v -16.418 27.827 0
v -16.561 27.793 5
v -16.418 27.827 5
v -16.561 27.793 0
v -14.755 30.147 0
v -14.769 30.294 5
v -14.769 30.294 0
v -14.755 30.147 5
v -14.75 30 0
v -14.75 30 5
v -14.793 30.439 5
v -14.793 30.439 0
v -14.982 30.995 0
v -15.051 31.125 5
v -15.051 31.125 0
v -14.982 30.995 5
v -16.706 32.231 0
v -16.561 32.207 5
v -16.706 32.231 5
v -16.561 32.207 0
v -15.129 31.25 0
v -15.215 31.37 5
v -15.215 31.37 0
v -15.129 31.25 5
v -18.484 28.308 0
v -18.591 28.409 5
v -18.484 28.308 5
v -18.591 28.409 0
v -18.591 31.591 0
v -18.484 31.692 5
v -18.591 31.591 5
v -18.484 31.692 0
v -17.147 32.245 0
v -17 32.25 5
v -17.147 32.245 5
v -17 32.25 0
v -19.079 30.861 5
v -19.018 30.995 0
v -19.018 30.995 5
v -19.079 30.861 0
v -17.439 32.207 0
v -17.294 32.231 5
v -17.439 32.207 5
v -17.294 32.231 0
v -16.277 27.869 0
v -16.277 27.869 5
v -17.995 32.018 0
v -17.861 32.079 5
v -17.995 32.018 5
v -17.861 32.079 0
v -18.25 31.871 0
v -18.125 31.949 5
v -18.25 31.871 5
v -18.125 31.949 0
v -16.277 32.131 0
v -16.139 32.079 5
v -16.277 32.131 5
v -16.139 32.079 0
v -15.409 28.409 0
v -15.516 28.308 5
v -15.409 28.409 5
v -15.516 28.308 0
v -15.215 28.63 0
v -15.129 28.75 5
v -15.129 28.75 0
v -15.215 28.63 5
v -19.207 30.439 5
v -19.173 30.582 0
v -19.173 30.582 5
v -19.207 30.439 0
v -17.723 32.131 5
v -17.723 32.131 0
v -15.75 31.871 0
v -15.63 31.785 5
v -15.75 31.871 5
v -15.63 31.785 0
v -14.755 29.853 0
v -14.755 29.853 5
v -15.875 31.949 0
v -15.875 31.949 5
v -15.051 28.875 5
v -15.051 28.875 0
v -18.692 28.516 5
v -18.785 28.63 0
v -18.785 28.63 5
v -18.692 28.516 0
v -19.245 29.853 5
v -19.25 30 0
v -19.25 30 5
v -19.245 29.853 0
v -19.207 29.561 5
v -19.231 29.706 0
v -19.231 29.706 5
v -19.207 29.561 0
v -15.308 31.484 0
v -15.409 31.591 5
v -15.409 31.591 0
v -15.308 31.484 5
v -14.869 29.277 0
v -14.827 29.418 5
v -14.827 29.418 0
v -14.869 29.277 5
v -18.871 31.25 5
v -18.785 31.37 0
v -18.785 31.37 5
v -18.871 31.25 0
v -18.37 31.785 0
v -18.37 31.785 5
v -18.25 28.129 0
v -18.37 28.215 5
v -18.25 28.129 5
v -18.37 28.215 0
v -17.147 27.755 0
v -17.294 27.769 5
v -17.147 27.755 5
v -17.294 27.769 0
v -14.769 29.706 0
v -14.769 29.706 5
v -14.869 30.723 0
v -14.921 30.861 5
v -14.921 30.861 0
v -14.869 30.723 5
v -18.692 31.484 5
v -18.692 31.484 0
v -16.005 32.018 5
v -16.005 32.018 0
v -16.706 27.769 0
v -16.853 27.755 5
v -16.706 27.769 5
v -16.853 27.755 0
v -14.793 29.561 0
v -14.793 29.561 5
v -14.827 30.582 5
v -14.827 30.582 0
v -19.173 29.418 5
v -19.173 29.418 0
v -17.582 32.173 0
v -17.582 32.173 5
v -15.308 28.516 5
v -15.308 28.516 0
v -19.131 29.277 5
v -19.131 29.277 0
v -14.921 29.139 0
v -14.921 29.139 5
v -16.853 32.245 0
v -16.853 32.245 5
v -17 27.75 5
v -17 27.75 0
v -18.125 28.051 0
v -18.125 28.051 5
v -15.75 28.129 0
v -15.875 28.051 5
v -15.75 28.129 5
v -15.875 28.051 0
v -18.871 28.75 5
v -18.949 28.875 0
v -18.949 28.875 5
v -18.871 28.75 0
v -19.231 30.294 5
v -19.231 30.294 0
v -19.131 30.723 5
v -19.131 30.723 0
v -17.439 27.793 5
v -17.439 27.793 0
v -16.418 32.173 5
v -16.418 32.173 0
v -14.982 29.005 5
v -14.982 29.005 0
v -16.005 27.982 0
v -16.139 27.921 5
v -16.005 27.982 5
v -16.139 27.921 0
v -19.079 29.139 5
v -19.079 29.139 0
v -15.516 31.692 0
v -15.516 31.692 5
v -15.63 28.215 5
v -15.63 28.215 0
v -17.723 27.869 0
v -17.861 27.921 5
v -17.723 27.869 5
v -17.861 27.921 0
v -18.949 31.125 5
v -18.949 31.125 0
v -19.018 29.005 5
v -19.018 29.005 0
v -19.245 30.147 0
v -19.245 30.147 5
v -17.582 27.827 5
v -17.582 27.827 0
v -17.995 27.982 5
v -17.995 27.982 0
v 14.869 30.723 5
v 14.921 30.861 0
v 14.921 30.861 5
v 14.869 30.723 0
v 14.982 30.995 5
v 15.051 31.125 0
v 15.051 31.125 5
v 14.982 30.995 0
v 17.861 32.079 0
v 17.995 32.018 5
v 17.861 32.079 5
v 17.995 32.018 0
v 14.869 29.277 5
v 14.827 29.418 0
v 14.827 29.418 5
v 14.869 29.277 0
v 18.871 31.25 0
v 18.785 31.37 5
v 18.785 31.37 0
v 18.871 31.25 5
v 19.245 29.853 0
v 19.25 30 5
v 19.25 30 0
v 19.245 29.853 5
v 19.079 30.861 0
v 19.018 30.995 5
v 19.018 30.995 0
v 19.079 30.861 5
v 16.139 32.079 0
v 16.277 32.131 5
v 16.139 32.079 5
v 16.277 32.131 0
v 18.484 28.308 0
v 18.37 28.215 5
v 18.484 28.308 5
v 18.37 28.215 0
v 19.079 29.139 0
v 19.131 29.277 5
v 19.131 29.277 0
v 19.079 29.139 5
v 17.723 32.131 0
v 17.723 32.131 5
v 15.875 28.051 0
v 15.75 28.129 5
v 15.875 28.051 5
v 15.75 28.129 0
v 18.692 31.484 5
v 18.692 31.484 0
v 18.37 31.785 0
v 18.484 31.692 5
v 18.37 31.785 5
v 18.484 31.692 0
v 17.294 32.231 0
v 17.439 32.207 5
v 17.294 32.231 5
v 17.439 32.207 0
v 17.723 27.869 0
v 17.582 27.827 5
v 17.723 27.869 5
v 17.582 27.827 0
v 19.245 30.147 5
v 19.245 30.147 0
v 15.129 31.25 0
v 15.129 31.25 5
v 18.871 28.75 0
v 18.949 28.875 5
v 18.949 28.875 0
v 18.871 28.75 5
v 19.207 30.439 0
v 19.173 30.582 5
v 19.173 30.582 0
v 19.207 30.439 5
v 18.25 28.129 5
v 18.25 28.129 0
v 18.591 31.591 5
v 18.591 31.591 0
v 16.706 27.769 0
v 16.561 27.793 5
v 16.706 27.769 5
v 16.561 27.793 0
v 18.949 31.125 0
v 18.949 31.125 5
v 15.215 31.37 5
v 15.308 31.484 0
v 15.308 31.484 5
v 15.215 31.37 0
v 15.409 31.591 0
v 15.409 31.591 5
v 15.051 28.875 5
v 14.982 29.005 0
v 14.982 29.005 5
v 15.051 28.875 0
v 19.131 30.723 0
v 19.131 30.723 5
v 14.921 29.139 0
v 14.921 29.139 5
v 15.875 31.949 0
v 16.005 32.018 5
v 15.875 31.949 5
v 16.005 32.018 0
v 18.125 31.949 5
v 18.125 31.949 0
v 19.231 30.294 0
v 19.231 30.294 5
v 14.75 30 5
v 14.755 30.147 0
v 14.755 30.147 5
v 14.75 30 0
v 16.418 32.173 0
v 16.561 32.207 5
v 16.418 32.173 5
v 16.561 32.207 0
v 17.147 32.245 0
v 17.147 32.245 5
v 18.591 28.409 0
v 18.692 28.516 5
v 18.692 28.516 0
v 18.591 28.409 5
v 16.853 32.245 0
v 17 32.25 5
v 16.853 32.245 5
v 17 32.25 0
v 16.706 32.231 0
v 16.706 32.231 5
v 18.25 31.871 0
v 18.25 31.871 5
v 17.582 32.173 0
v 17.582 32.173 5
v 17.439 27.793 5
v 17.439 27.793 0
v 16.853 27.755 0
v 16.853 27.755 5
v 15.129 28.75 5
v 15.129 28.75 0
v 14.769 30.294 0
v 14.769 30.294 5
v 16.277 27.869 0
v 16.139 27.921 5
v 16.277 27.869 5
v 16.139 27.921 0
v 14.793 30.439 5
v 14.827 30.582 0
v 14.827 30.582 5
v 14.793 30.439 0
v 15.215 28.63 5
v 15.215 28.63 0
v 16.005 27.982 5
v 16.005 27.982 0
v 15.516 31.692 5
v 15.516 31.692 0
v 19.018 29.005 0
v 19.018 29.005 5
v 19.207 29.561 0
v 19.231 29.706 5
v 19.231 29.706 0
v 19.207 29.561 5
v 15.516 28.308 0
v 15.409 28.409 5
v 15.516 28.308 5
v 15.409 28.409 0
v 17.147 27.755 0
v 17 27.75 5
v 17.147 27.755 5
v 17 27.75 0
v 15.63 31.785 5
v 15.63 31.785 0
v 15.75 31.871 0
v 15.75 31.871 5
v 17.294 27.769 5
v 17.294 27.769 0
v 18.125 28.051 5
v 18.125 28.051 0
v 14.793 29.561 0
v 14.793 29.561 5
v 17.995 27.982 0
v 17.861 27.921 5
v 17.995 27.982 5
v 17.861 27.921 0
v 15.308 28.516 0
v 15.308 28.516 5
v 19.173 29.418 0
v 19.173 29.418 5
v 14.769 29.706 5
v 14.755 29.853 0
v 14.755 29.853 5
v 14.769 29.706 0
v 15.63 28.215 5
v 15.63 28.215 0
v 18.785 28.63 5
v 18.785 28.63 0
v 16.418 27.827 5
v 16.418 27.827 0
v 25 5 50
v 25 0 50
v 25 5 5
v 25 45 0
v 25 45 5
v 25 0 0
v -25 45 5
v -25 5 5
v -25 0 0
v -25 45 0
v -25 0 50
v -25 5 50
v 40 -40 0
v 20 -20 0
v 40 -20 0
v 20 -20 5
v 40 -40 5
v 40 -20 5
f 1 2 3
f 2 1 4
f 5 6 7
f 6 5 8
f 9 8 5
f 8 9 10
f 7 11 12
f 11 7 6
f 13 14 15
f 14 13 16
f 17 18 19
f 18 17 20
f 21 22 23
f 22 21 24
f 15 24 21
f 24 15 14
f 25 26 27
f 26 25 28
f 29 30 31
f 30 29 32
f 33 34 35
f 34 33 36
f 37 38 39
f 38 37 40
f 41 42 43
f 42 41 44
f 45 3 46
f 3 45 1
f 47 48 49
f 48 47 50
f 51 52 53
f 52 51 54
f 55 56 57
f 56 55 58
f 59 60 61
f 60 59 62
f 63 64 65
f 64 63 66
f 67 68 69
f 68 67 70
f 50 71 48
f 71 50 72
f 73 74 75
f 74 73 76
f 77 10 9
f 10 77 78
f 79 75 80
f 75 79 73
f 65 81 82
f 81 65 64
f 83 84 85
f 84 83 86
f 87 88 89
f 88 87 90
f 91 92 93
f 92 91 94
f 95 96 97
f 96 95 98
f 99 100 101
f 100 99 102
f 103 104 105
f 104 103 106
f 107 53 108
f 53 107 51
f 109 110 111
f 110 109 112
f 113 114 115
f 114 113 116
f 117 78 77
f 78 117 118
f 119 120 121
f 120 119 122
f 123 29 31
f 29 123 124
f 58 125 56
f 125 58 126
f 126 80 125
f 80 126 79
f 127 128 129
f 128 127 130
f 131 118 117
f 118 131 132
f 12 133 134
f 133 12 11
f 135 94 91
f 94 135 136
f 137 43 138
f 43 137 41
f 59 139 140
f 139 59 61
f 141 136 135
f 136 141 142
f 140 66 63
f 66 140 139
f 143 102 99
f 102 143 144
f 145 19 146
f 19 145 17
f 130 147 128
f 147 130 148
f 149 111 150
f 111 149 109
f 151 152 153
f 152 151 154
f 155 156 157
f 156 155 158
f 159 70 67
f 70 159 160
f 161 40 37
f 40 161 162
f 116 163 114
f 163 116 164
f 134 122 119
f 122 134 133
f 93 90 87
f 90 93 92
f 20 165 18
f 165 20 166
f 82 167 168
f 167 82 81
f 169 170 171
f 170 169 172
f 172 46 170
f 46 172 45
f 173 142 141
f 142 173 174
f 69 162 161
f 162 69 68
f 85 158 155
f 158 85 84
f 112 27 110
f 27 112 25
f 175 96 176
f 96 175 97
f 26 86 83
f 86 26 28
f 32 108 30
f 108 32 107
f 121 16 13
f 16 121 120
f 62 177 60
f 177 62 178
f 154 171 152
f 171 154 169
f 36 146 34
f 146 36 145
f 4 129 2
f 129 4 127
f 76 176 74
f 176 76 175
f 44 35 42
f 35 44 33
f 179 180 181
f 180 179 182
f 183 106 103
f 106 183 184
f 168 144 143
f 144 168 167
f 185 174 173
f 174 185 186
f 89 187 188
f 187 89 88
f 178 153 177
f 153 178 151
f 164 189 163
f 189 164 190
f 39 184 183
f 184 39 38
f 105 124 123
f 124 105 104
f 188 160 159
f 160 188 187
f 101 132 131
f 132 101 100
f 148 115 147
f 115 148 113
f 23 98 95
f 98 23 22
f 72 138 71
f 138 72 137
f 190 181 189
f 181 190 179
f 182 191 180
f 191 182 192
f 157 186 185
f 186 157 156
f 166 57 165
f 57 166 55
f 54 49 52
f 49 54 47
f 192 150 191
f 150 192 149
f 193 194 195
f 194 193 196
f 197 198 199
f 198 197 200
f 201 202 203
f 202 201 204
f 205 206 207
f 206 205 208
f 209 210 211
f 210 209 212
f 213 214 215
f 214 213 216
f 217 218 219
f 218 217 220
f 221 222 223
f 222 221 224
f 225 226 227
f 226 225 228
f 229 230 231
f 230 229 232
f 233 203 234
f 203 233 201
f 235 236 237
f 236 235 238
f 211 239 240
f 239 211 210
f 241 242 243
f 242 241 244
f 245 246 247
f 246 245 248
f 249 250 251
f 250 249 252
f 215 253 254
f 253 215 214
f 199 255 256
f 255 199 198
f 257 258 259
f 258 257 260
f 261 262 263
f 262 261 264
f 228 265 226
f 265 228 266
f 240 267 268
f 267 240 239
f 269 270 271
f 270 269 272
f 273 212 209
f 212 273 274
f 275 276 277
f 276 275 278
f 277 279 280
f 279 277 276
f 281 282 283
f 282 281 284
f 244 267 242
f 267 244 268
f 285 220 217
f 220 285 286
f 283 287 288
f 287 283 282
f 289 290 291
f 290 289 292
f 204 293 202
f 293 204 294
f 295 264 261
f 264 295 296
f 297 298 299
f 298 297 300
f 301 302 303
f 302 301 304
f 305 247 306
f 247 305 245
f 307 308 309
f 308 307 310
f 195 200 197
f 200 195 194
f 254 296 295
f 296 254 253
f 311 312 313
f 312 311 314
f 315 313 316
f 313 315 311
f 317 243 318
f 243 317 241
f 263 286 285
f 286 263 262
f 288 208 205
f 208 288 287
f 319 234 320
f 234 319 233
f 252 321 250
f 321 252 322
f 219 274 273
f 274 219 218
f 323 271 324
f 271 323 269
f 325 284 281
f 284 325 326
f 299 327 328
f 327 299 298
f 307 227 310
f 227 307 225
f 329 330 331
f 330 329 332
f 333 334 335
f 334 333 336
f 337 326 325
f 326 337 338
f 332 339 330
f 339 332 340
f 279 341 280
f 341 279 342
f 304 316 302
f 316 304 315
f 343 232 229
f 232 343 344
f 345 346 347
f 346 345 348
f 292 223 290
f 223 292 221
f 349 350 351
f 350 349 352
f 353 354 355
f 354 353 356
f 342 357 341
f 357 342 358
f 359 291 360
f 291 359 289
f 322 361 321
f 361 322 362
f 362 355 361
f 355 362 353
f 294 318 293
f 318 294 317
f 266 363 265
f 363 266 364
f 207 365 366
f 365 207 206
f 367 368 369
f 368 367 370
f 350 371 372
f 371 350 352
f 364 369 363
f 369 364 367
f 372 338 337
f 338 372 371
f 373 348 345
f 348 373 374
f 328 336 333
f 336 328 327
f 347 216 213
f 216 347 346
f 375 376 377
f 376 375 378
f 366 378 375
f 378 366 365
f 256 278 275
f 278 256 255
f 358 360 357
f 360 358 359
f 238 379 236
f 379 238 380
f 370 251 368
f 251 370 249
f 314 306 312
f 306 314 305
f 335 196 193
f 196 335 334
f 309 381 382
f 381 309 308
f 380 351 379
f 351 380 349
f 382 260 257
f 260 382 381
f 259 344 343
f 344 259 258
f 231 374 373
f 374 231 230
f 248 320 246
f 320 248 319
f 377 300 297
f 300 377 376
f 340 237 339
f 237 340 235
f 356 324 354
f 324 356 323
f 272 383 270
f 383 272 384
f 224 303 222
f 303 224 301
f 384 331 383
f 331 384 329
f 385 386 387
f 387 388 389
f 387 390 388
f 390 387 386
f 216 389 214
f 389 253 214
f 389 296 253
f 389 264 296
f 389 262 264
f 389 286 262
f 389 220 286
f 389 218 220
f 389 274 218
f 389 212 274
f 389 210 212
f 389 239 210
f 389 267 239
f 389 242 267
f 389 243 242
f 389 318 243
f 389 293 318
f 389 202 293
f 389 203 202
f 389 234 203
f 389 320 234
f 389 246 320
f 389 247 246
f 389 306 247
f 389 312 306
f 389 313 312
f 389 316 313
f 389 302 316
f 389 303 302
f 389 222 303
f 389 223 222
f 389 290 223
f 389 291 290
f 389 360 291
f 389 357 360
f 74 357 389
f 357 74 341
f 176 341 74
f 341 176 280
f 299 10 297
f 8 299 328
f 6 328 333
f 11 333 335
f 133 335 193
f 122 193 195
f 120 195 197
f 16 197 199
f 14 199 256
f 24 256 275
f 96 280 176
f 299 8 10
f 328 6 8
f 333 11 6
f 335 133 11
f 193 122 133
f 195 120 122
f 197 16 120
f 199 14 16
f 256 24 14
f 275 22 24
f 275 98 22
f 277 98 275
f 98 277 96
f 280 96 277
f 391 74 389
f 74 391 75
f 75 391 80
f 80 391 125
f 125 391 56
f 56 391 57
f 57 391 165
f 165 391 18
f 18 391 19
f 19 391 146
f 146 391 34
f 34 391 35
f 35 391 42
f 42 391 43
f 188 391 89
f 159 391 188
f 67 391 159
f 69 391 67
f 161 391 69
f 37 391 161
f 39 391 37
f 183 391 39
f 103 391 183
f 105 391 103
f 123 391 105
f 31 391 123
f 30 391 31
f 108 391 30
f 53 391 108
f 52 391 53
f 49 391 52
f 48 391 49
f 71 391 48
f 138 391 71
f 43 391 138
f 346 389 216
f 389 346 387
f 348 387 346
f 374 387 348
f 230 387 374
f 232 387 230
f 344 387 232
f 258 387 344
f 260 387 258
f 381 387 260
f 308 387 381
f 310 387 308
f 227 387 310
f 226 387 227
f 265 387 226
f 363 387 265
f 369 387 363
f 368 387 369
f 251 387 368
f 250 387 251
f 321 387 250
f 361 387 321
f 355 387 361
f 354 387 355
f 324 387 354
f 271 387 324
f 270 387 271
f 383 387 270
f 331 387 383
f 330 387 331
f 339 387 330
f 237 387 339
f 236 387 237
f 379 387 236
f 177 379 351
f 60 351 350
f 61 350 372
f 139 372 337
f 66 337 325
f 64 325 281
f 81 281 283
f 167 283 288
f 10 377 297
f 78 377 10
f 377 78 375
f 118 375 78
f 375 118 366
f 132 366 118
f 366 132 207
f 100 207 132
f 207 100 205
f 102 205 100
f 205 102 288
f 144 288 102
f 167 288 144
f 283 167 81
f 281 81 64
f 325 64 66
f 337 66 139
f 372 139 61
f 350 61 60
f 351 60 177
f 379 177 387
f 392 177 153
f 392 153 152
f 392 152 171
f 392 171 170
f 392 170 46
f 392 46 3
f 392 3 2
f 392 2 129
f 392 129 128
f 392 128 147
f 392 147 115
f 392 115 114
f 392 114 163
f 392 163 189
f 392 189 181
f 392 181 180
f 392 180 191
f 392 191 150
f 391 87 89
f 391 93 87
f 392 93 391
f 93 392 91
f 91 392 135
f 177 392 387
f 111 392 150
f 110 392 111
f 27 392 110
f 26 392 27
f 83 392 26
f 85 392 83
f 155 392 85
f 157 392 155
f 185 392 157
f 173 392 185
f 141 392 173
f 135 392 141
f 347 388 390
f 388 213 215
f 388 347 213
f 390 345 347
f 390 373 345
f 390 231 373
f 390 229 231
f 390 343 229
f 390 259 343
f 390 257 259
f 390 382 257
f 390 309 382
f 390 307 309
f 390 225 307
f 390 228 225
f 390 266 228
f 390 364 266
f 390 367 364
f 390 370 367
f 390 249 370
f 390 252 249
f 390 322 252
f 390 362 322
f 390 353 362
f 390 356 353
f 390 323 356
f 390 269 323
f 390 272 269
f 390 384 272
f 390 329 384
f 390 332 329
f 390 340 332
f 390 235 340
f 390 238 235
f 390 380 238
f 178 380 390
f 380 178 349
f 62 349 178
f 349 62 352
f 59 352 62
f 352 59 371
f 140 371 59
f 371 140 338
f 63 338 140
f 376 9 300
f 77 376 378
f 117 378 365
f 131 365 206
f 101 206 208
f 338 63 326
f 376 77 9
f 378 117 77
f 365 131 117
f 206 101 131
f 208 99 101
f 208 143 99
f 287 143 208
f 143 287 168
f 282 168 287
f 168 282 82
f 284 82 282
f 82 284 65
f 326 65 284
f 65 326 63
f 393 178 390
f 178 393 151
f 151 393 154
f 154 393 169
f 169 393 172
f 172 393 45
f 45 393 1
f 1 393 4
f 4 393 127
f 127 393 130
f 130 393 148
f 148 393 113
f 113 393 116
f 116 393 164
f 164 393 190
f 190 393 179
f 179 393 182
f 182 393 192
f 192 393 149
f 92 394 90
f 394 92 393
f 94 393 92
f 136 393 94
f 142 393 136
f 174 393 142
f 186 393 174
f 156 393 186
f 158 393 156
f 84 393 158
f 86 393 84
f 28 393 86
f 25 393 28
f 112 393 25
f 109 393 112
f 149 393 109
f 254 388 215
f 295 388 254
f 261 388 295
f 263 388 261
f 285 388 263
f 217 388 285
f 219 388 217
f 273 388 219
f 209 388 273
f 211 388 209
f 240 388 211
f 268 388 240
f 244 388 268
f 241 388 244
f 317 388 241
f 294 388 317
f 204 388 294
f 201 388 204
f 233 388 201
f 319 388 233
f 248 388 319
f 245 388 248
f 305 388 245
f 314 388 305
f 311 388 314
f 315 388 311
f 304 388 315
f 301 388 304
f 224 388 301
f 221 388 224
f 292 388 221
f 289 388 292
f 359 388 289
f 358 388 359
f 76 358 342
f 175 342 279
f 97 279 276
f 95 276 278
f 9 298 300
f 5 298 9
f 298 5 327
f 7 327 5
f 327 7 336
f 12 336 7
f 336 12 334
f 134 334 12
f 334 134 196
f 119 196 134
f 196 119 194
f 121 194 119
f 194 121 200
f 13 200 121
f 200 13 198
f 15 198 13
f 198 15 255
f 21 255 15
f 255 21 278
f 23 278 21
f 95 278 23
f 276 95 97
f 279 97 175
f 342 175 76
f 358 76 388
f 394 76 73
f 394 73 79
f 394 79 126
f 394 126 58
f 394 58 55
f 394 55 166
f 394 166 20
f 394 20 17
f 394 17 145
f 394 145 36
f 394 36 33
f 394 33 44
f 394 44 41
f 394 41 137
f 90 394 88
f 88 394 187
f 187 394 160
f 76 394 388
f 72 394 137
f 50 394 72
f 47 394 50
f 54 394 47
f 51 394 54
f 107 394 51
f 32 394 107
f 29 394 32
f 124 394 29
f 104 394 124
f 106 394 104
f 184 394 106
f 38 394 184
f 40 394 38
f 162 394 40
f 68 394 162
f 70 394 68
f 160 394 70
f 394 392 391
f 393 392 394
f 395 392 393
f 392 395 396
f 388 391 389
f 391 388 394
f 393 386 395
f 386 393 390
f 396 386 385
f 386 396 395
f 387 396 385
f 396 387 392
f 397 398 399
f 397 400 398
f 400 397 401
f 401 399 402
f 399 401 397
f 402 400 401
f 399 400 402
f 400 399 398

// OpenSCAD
// L-shaped mounting bracket for NEMA 17 stepper motor (syringe pump)
// Print orientation: base plate on bed, vertical motor plate builds up +Z

// ---------- Parameters ----------
base_x0      = -25;   // base plate x start
base_x1      = 25;    // base plate x end
base_y0      = 0;     // base plate y start
base_y1      = 45;    // base plate y end
base_z       = 5;     // base plate thickness

motor_plate_x0 = -25;  // motor plate x start
motor_plate_x1 = 25;   // motor plate x end
motor_plate_y  = 5;    // motor plate thickness (y)
motor_plate_z0 = 0;    // motor plate z start
motor_plate_z1 = 50;   // motor plate z end

boss_d       = 23;     // motor centring boss hole diameter
boss_x       = 0;      // boss hole centre x
boss_z       = 28;     // boss hole centre z
screw_d      = 3.4;    // M3 screw holes diameter
screw_n      = 4;      // number of screw holes
screw_pitch  = 31;     // square pattern side length
screw_x0     = -15.5;  // first screw x (square pattern start)
screw_y0     = 15.5;   // first screw y (square pattern start)

gusset_t     = 5;      // gusset thickness (x)
gusset_leg   = 20;     // gusset right-angle leg length (y and z)
gusset_x0    = -25;    // gusset x start (left edge)
gusset_x1    = -20;    // gusset x end (left gusset)
gusset_x1_r  = 20;     // right gusset x start
gusset_x1_e  = 25;     // right gusset x end

eps          = 0.5;    // cutter overshoot past faces
$fn          = 96;     // curve resolution

// ---------- Model ----------
union() {
    // Base plate with M4 through-holes
    difference() {
        translate([base_x0, base_y0, 0])
            cube([base_x1 - base_x0, base_y1 - base_y0, base_z]);
        for (sx = [-17, 17], sy = [30])
            translate([sx, sy, -eps])
                cylinder(d = 4.5, h = base_z + 2 * eps);
    }

    // Vertical motor plate with boss hole and M3 screw holes
    difference() {
        translate([motor_plate_x0, 0, motor_plate_z0])
            cube([motor_plate_x1 - motor_plate_x0, motor_plate_y, motor_plate_z1 - motor_plate_z0]);
        // Boss hole along Y
        translate([boss_x, -eps, boss_z])
            rotate([90, 0, 0])
                cylinder(d = boss_d, h = motor_plate_y + 2 * eps);
        // Screw holes on square pattern, centred on boss hole
        for (i = [0 : screw_n - 1]) {
            a = screw_pitch / 2;
            x = screw_x0 + a * (i % 2 - 0.5);
            y = screw_y0 + a * (i / 2 - 0.5);
            translate([x, y, 0])
                cylinder(d = screw_d, h = motor_plate_y + 2 * eps);
        }
    }

    // Gussets, flush with left and right edges
    for (gx = [gusset_x0, gusset_x1_r]) {
        translate([gx, gusset_x1 - gx, 0])
            linear_extrude(height = gusset_t)
                polygon([
                    [gusset_leg, gusset_leg],   // right-angle corner at y=5, z=5
                    [gusset_leg, 0],
                    [0, gusset_leg]
                ]);
    }
}
